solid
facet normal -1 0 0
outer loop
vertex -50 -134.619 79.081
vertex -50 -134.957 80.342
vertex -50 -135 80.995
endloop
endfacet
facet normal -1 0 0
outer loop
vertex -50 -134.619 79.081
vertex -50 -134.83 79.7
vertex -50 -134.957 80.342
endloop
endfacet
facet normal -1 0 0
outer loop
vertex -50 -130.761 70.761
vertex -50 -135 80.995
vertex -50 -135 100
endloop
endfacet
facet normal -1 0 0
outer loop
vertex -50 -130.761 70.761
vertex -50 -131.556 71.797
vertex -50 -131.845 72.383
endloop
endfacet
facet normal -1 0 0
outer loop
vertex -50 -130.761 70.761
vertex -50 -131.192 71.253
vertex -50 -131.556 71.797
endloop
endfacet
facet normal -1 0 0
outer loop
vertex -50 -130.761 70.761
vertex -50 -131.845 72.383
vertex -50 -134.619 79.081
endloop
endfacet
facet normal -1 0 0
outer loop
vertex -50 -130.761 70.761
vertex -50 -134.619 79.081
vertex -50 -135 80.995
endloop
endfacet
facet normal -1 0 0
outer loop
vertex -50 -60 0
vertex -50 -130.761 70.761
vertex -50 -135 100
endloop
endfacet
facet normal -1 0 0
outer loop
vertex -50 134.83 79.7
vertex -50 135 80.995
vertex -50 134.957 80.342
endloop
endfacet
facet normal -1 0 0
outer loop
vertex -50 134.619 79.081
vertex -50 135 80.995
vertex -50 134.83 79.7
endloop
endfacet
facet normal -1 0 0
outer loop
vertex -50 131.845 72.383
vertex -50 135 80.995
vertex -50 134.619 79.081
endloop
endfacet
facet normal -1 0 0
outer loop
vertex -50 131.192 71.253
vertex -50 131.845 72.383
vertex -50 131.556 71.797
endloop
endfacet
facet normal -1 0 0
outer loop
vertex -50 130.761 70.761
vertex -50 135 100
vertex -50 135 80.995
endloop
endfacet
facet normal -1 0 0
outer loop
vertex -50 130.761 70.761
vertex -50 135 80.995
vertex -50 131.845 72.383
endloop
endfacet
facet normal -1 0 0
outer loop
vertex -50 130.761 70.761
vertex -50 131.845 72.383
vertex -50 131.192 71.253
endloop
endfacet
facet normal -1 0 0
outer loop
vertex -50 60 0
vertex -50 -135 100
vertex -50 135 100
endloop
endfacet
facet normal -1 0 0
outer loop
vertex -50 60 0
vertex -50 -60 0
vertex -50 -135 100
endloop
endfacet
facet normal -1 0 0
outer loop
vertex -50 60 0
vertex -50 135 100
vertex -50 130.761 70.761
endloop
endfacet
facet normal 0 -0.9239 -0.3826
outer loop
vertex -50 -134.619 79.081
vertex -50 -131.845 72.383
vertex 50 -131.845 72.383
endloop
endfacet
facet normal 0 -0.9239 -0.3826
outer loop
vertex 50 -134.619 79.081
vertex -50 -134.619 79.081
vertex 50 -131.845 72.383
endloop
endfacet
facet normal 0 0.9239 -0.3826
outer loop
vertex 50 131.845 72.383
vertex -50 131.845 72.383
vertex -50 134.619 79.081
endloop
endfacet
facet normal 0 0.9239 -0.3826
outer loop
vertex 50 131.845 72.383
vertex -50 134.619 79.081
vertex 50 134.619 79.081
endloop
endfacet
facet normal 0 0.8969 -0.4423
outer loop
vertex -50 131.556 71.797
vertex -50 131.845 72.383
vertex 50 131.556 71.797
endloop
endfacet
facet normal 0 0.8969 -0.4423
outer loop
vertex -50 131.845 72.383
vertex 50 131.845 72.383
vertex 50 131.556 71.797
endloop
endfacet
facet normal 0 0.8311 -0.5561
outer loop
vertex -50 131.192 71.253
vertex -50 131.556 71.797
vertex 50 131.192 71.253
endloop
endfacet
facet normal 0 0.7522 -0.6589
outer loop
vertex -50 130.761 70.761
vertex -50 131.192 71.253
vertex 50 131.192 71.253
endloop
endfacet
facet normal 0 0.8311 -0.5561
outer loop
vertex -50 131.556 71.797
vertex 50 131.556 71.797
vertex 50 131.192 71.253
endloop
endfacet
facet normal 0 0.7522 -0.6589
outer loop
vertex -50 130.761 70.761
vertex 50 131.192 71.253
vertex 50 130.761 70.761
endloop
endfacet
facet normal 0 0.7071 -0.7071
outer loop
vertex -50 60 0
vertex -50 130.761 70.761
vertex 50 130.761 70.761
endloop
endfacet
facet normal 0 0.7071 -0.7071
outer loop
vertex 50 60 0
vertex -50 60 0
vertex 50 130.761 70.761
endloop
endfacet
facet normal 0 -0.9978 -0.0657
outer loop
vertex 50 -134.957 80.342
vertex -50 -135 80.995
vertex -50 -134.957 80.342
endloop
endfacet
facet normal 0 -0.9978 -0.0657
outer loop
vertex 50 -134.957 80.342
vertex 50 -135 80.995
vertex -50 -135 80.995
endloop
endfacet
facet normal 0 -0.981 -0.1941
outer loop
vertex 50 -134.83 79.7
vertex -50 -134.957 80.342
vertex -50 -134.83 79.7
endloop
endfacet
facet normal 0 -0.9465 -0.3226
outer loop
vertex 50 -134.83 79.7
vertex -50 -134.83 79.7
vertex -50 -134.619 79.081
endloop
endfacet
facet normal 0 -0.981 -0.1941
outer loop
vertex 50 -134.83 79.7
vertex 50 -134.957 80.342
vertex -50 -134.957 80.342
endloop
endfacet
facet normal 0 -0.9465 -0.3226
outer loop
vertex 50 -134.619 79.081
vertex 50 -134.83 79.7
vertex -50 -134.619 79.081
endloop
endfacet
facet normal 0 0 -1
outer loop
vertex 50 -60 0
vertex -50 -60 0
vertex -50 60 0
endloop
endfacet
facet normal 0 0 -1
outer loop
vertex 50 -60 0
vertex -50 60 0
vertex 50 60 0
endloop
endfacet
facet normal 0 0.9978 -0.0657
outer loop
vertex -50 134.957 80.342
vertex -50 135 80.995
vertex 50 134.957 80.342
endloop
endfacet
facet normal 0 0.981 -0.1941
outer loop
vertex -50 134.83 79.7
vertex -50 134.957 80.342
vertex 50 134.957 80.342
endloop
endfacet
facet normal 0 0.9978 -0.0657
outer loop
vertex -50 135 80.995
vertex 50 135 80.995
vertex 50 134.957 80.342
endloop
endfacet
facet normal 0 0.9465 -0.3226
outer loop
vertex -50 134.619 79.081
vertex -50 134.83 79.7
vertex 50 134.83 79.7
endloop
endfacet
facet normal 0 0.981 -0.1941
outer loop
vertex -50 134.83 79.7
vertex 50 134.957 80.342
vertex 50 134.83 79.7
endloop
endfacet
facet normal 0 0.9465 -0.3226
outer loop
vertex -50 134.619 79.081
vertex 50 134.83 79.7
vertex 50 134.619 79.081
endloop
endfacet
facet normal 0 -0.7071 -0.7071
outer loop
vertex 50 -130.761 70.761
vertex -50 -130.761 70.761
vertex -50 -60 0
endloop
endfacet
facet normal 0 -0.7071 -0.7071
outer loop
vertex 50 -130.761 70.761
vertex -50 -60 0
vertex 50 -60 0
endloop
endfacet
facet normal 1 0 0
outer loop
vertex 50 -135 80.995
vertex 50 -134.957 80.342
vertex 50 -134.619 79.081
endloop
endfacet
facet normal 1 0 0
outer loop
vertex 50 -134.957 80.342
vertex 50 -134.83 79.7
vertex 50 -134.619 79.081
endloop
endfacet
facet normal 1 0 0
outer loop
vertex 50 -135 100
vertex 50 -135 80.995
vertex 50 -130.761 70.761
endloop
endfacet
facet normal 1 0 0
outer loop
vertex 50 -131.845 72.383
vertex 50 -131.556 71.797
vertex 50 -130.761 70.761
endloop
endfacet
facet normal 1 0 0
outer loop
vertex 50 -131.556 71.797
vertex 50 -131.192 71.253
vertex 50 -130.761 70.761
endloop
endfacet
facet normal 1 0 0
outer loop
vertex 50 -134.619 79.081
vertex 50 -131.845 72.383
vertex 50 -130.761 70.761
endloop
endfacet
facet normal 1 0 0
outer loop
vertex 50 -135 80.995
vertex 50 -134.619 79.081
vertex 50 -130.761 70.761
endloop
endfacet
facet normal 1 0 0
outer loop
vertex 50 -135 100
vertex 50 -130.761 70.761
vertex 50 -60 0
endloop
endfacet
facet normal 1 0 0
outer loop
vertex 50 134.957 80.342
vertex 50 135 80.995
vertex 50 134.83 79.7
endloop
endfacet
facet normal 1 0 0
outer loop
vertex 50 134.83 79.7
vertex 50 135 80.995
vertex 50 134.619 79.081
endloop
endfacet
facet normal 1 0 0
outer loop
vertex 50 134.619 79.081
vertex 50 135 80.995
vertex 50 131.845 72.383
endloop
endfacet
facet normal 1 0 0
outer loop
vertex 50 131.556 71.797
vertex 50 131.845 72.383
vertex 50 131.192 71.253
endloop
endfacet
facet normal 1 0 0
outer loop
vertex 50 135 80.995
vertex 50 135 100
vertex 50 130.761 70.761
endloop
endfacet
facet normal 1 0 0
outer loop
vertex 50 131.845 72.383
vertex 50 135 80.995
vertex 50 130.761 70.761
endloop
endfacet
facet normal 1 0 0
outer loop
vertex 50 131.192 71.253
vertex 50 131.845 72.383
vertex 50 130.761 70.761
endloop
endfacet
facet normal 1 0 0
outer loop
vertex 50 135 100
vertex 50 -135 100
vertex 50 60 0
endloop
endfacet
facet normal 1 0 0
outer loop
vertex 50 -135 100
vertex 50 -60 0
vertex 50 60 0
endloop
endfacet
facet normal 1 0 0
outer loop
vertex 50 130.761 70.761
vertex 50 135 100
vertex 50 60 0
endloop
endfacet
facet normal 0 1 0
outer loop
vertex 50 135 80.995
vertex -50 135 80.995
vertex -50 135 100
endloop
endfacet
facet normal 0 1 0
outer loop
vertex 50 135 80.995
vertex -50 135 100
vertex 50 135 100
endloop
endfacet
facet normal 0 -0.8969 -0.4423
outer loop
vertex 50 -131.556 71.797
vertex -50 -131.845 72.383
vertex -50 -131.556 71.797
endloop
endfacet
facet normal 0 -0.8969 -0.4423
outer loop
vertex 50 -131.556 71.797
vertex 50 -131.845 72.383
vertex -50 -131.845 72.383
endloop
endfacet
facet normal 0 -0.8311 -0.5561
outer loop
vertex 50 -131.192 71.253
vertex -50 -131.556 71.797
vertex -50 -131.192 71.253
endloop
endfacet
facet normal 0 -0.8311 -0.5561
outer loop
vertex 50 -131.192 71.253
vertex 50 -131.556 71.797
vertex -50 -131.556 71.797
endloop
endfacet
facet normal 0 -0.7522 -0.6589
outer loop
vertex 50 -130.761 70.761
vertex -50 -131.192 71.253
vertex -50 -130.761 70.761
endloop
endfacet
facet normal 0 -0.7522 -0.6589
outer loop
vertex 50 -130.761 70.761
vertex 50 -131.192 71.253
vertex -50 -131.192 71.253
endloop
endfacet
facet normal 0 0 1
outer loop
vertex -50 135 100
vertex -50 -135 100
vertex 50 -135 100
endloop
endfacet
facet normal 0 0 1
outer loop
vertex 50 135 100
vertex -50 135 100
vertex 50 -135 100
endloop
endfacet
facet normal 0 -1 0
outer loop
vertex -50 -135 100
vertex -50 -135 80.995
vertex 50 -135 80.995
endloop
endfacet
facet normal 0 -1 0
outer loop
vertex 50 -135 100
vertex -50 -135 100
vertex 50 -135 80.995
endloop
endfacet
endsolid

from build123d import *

# Parameters (mm, degrees)
F0_W     = 100
F0_H     = 270
F1_DEPTH = 100
F2_SIZE  = 75
F3_SIZE  = 5
F4_R     = 5


with BuildPart() as f1:
    # F0 (on Top) → F1 (new body)
    with BuildSketch(Plane.XY):
        Rectangle(F0_W, F0_H)
    extrude(amount=F1_DEPTH)

    # F2
    f2_edges = [f1.edges().sort_by_distance(p)[0] for p in [
        (0, -135, 0),
        (0, 135, 0),
    ]]
    chamfer(f2_edges, length=F2_SIZE)

    # F3
    f3_edges = [f1.edges().sort_by_distance(p)[0] for p in [
        (0, -135, 75),
        (0, 135, 75),
    ]]
    chamfer(f3_edges, length=F3_SIZE)

    # F4
    f4_edges = [f1.edges().sort_by_distance(p)[0] for p in [
        (0, 135, 80),
        (0, 131.464466, 71.464466),
        (0, -135, 80),
        (0, -131.464466, 71.464466),
    ]]
    fillet(f4_edges, radius=F4_R)


solid = f1.part
